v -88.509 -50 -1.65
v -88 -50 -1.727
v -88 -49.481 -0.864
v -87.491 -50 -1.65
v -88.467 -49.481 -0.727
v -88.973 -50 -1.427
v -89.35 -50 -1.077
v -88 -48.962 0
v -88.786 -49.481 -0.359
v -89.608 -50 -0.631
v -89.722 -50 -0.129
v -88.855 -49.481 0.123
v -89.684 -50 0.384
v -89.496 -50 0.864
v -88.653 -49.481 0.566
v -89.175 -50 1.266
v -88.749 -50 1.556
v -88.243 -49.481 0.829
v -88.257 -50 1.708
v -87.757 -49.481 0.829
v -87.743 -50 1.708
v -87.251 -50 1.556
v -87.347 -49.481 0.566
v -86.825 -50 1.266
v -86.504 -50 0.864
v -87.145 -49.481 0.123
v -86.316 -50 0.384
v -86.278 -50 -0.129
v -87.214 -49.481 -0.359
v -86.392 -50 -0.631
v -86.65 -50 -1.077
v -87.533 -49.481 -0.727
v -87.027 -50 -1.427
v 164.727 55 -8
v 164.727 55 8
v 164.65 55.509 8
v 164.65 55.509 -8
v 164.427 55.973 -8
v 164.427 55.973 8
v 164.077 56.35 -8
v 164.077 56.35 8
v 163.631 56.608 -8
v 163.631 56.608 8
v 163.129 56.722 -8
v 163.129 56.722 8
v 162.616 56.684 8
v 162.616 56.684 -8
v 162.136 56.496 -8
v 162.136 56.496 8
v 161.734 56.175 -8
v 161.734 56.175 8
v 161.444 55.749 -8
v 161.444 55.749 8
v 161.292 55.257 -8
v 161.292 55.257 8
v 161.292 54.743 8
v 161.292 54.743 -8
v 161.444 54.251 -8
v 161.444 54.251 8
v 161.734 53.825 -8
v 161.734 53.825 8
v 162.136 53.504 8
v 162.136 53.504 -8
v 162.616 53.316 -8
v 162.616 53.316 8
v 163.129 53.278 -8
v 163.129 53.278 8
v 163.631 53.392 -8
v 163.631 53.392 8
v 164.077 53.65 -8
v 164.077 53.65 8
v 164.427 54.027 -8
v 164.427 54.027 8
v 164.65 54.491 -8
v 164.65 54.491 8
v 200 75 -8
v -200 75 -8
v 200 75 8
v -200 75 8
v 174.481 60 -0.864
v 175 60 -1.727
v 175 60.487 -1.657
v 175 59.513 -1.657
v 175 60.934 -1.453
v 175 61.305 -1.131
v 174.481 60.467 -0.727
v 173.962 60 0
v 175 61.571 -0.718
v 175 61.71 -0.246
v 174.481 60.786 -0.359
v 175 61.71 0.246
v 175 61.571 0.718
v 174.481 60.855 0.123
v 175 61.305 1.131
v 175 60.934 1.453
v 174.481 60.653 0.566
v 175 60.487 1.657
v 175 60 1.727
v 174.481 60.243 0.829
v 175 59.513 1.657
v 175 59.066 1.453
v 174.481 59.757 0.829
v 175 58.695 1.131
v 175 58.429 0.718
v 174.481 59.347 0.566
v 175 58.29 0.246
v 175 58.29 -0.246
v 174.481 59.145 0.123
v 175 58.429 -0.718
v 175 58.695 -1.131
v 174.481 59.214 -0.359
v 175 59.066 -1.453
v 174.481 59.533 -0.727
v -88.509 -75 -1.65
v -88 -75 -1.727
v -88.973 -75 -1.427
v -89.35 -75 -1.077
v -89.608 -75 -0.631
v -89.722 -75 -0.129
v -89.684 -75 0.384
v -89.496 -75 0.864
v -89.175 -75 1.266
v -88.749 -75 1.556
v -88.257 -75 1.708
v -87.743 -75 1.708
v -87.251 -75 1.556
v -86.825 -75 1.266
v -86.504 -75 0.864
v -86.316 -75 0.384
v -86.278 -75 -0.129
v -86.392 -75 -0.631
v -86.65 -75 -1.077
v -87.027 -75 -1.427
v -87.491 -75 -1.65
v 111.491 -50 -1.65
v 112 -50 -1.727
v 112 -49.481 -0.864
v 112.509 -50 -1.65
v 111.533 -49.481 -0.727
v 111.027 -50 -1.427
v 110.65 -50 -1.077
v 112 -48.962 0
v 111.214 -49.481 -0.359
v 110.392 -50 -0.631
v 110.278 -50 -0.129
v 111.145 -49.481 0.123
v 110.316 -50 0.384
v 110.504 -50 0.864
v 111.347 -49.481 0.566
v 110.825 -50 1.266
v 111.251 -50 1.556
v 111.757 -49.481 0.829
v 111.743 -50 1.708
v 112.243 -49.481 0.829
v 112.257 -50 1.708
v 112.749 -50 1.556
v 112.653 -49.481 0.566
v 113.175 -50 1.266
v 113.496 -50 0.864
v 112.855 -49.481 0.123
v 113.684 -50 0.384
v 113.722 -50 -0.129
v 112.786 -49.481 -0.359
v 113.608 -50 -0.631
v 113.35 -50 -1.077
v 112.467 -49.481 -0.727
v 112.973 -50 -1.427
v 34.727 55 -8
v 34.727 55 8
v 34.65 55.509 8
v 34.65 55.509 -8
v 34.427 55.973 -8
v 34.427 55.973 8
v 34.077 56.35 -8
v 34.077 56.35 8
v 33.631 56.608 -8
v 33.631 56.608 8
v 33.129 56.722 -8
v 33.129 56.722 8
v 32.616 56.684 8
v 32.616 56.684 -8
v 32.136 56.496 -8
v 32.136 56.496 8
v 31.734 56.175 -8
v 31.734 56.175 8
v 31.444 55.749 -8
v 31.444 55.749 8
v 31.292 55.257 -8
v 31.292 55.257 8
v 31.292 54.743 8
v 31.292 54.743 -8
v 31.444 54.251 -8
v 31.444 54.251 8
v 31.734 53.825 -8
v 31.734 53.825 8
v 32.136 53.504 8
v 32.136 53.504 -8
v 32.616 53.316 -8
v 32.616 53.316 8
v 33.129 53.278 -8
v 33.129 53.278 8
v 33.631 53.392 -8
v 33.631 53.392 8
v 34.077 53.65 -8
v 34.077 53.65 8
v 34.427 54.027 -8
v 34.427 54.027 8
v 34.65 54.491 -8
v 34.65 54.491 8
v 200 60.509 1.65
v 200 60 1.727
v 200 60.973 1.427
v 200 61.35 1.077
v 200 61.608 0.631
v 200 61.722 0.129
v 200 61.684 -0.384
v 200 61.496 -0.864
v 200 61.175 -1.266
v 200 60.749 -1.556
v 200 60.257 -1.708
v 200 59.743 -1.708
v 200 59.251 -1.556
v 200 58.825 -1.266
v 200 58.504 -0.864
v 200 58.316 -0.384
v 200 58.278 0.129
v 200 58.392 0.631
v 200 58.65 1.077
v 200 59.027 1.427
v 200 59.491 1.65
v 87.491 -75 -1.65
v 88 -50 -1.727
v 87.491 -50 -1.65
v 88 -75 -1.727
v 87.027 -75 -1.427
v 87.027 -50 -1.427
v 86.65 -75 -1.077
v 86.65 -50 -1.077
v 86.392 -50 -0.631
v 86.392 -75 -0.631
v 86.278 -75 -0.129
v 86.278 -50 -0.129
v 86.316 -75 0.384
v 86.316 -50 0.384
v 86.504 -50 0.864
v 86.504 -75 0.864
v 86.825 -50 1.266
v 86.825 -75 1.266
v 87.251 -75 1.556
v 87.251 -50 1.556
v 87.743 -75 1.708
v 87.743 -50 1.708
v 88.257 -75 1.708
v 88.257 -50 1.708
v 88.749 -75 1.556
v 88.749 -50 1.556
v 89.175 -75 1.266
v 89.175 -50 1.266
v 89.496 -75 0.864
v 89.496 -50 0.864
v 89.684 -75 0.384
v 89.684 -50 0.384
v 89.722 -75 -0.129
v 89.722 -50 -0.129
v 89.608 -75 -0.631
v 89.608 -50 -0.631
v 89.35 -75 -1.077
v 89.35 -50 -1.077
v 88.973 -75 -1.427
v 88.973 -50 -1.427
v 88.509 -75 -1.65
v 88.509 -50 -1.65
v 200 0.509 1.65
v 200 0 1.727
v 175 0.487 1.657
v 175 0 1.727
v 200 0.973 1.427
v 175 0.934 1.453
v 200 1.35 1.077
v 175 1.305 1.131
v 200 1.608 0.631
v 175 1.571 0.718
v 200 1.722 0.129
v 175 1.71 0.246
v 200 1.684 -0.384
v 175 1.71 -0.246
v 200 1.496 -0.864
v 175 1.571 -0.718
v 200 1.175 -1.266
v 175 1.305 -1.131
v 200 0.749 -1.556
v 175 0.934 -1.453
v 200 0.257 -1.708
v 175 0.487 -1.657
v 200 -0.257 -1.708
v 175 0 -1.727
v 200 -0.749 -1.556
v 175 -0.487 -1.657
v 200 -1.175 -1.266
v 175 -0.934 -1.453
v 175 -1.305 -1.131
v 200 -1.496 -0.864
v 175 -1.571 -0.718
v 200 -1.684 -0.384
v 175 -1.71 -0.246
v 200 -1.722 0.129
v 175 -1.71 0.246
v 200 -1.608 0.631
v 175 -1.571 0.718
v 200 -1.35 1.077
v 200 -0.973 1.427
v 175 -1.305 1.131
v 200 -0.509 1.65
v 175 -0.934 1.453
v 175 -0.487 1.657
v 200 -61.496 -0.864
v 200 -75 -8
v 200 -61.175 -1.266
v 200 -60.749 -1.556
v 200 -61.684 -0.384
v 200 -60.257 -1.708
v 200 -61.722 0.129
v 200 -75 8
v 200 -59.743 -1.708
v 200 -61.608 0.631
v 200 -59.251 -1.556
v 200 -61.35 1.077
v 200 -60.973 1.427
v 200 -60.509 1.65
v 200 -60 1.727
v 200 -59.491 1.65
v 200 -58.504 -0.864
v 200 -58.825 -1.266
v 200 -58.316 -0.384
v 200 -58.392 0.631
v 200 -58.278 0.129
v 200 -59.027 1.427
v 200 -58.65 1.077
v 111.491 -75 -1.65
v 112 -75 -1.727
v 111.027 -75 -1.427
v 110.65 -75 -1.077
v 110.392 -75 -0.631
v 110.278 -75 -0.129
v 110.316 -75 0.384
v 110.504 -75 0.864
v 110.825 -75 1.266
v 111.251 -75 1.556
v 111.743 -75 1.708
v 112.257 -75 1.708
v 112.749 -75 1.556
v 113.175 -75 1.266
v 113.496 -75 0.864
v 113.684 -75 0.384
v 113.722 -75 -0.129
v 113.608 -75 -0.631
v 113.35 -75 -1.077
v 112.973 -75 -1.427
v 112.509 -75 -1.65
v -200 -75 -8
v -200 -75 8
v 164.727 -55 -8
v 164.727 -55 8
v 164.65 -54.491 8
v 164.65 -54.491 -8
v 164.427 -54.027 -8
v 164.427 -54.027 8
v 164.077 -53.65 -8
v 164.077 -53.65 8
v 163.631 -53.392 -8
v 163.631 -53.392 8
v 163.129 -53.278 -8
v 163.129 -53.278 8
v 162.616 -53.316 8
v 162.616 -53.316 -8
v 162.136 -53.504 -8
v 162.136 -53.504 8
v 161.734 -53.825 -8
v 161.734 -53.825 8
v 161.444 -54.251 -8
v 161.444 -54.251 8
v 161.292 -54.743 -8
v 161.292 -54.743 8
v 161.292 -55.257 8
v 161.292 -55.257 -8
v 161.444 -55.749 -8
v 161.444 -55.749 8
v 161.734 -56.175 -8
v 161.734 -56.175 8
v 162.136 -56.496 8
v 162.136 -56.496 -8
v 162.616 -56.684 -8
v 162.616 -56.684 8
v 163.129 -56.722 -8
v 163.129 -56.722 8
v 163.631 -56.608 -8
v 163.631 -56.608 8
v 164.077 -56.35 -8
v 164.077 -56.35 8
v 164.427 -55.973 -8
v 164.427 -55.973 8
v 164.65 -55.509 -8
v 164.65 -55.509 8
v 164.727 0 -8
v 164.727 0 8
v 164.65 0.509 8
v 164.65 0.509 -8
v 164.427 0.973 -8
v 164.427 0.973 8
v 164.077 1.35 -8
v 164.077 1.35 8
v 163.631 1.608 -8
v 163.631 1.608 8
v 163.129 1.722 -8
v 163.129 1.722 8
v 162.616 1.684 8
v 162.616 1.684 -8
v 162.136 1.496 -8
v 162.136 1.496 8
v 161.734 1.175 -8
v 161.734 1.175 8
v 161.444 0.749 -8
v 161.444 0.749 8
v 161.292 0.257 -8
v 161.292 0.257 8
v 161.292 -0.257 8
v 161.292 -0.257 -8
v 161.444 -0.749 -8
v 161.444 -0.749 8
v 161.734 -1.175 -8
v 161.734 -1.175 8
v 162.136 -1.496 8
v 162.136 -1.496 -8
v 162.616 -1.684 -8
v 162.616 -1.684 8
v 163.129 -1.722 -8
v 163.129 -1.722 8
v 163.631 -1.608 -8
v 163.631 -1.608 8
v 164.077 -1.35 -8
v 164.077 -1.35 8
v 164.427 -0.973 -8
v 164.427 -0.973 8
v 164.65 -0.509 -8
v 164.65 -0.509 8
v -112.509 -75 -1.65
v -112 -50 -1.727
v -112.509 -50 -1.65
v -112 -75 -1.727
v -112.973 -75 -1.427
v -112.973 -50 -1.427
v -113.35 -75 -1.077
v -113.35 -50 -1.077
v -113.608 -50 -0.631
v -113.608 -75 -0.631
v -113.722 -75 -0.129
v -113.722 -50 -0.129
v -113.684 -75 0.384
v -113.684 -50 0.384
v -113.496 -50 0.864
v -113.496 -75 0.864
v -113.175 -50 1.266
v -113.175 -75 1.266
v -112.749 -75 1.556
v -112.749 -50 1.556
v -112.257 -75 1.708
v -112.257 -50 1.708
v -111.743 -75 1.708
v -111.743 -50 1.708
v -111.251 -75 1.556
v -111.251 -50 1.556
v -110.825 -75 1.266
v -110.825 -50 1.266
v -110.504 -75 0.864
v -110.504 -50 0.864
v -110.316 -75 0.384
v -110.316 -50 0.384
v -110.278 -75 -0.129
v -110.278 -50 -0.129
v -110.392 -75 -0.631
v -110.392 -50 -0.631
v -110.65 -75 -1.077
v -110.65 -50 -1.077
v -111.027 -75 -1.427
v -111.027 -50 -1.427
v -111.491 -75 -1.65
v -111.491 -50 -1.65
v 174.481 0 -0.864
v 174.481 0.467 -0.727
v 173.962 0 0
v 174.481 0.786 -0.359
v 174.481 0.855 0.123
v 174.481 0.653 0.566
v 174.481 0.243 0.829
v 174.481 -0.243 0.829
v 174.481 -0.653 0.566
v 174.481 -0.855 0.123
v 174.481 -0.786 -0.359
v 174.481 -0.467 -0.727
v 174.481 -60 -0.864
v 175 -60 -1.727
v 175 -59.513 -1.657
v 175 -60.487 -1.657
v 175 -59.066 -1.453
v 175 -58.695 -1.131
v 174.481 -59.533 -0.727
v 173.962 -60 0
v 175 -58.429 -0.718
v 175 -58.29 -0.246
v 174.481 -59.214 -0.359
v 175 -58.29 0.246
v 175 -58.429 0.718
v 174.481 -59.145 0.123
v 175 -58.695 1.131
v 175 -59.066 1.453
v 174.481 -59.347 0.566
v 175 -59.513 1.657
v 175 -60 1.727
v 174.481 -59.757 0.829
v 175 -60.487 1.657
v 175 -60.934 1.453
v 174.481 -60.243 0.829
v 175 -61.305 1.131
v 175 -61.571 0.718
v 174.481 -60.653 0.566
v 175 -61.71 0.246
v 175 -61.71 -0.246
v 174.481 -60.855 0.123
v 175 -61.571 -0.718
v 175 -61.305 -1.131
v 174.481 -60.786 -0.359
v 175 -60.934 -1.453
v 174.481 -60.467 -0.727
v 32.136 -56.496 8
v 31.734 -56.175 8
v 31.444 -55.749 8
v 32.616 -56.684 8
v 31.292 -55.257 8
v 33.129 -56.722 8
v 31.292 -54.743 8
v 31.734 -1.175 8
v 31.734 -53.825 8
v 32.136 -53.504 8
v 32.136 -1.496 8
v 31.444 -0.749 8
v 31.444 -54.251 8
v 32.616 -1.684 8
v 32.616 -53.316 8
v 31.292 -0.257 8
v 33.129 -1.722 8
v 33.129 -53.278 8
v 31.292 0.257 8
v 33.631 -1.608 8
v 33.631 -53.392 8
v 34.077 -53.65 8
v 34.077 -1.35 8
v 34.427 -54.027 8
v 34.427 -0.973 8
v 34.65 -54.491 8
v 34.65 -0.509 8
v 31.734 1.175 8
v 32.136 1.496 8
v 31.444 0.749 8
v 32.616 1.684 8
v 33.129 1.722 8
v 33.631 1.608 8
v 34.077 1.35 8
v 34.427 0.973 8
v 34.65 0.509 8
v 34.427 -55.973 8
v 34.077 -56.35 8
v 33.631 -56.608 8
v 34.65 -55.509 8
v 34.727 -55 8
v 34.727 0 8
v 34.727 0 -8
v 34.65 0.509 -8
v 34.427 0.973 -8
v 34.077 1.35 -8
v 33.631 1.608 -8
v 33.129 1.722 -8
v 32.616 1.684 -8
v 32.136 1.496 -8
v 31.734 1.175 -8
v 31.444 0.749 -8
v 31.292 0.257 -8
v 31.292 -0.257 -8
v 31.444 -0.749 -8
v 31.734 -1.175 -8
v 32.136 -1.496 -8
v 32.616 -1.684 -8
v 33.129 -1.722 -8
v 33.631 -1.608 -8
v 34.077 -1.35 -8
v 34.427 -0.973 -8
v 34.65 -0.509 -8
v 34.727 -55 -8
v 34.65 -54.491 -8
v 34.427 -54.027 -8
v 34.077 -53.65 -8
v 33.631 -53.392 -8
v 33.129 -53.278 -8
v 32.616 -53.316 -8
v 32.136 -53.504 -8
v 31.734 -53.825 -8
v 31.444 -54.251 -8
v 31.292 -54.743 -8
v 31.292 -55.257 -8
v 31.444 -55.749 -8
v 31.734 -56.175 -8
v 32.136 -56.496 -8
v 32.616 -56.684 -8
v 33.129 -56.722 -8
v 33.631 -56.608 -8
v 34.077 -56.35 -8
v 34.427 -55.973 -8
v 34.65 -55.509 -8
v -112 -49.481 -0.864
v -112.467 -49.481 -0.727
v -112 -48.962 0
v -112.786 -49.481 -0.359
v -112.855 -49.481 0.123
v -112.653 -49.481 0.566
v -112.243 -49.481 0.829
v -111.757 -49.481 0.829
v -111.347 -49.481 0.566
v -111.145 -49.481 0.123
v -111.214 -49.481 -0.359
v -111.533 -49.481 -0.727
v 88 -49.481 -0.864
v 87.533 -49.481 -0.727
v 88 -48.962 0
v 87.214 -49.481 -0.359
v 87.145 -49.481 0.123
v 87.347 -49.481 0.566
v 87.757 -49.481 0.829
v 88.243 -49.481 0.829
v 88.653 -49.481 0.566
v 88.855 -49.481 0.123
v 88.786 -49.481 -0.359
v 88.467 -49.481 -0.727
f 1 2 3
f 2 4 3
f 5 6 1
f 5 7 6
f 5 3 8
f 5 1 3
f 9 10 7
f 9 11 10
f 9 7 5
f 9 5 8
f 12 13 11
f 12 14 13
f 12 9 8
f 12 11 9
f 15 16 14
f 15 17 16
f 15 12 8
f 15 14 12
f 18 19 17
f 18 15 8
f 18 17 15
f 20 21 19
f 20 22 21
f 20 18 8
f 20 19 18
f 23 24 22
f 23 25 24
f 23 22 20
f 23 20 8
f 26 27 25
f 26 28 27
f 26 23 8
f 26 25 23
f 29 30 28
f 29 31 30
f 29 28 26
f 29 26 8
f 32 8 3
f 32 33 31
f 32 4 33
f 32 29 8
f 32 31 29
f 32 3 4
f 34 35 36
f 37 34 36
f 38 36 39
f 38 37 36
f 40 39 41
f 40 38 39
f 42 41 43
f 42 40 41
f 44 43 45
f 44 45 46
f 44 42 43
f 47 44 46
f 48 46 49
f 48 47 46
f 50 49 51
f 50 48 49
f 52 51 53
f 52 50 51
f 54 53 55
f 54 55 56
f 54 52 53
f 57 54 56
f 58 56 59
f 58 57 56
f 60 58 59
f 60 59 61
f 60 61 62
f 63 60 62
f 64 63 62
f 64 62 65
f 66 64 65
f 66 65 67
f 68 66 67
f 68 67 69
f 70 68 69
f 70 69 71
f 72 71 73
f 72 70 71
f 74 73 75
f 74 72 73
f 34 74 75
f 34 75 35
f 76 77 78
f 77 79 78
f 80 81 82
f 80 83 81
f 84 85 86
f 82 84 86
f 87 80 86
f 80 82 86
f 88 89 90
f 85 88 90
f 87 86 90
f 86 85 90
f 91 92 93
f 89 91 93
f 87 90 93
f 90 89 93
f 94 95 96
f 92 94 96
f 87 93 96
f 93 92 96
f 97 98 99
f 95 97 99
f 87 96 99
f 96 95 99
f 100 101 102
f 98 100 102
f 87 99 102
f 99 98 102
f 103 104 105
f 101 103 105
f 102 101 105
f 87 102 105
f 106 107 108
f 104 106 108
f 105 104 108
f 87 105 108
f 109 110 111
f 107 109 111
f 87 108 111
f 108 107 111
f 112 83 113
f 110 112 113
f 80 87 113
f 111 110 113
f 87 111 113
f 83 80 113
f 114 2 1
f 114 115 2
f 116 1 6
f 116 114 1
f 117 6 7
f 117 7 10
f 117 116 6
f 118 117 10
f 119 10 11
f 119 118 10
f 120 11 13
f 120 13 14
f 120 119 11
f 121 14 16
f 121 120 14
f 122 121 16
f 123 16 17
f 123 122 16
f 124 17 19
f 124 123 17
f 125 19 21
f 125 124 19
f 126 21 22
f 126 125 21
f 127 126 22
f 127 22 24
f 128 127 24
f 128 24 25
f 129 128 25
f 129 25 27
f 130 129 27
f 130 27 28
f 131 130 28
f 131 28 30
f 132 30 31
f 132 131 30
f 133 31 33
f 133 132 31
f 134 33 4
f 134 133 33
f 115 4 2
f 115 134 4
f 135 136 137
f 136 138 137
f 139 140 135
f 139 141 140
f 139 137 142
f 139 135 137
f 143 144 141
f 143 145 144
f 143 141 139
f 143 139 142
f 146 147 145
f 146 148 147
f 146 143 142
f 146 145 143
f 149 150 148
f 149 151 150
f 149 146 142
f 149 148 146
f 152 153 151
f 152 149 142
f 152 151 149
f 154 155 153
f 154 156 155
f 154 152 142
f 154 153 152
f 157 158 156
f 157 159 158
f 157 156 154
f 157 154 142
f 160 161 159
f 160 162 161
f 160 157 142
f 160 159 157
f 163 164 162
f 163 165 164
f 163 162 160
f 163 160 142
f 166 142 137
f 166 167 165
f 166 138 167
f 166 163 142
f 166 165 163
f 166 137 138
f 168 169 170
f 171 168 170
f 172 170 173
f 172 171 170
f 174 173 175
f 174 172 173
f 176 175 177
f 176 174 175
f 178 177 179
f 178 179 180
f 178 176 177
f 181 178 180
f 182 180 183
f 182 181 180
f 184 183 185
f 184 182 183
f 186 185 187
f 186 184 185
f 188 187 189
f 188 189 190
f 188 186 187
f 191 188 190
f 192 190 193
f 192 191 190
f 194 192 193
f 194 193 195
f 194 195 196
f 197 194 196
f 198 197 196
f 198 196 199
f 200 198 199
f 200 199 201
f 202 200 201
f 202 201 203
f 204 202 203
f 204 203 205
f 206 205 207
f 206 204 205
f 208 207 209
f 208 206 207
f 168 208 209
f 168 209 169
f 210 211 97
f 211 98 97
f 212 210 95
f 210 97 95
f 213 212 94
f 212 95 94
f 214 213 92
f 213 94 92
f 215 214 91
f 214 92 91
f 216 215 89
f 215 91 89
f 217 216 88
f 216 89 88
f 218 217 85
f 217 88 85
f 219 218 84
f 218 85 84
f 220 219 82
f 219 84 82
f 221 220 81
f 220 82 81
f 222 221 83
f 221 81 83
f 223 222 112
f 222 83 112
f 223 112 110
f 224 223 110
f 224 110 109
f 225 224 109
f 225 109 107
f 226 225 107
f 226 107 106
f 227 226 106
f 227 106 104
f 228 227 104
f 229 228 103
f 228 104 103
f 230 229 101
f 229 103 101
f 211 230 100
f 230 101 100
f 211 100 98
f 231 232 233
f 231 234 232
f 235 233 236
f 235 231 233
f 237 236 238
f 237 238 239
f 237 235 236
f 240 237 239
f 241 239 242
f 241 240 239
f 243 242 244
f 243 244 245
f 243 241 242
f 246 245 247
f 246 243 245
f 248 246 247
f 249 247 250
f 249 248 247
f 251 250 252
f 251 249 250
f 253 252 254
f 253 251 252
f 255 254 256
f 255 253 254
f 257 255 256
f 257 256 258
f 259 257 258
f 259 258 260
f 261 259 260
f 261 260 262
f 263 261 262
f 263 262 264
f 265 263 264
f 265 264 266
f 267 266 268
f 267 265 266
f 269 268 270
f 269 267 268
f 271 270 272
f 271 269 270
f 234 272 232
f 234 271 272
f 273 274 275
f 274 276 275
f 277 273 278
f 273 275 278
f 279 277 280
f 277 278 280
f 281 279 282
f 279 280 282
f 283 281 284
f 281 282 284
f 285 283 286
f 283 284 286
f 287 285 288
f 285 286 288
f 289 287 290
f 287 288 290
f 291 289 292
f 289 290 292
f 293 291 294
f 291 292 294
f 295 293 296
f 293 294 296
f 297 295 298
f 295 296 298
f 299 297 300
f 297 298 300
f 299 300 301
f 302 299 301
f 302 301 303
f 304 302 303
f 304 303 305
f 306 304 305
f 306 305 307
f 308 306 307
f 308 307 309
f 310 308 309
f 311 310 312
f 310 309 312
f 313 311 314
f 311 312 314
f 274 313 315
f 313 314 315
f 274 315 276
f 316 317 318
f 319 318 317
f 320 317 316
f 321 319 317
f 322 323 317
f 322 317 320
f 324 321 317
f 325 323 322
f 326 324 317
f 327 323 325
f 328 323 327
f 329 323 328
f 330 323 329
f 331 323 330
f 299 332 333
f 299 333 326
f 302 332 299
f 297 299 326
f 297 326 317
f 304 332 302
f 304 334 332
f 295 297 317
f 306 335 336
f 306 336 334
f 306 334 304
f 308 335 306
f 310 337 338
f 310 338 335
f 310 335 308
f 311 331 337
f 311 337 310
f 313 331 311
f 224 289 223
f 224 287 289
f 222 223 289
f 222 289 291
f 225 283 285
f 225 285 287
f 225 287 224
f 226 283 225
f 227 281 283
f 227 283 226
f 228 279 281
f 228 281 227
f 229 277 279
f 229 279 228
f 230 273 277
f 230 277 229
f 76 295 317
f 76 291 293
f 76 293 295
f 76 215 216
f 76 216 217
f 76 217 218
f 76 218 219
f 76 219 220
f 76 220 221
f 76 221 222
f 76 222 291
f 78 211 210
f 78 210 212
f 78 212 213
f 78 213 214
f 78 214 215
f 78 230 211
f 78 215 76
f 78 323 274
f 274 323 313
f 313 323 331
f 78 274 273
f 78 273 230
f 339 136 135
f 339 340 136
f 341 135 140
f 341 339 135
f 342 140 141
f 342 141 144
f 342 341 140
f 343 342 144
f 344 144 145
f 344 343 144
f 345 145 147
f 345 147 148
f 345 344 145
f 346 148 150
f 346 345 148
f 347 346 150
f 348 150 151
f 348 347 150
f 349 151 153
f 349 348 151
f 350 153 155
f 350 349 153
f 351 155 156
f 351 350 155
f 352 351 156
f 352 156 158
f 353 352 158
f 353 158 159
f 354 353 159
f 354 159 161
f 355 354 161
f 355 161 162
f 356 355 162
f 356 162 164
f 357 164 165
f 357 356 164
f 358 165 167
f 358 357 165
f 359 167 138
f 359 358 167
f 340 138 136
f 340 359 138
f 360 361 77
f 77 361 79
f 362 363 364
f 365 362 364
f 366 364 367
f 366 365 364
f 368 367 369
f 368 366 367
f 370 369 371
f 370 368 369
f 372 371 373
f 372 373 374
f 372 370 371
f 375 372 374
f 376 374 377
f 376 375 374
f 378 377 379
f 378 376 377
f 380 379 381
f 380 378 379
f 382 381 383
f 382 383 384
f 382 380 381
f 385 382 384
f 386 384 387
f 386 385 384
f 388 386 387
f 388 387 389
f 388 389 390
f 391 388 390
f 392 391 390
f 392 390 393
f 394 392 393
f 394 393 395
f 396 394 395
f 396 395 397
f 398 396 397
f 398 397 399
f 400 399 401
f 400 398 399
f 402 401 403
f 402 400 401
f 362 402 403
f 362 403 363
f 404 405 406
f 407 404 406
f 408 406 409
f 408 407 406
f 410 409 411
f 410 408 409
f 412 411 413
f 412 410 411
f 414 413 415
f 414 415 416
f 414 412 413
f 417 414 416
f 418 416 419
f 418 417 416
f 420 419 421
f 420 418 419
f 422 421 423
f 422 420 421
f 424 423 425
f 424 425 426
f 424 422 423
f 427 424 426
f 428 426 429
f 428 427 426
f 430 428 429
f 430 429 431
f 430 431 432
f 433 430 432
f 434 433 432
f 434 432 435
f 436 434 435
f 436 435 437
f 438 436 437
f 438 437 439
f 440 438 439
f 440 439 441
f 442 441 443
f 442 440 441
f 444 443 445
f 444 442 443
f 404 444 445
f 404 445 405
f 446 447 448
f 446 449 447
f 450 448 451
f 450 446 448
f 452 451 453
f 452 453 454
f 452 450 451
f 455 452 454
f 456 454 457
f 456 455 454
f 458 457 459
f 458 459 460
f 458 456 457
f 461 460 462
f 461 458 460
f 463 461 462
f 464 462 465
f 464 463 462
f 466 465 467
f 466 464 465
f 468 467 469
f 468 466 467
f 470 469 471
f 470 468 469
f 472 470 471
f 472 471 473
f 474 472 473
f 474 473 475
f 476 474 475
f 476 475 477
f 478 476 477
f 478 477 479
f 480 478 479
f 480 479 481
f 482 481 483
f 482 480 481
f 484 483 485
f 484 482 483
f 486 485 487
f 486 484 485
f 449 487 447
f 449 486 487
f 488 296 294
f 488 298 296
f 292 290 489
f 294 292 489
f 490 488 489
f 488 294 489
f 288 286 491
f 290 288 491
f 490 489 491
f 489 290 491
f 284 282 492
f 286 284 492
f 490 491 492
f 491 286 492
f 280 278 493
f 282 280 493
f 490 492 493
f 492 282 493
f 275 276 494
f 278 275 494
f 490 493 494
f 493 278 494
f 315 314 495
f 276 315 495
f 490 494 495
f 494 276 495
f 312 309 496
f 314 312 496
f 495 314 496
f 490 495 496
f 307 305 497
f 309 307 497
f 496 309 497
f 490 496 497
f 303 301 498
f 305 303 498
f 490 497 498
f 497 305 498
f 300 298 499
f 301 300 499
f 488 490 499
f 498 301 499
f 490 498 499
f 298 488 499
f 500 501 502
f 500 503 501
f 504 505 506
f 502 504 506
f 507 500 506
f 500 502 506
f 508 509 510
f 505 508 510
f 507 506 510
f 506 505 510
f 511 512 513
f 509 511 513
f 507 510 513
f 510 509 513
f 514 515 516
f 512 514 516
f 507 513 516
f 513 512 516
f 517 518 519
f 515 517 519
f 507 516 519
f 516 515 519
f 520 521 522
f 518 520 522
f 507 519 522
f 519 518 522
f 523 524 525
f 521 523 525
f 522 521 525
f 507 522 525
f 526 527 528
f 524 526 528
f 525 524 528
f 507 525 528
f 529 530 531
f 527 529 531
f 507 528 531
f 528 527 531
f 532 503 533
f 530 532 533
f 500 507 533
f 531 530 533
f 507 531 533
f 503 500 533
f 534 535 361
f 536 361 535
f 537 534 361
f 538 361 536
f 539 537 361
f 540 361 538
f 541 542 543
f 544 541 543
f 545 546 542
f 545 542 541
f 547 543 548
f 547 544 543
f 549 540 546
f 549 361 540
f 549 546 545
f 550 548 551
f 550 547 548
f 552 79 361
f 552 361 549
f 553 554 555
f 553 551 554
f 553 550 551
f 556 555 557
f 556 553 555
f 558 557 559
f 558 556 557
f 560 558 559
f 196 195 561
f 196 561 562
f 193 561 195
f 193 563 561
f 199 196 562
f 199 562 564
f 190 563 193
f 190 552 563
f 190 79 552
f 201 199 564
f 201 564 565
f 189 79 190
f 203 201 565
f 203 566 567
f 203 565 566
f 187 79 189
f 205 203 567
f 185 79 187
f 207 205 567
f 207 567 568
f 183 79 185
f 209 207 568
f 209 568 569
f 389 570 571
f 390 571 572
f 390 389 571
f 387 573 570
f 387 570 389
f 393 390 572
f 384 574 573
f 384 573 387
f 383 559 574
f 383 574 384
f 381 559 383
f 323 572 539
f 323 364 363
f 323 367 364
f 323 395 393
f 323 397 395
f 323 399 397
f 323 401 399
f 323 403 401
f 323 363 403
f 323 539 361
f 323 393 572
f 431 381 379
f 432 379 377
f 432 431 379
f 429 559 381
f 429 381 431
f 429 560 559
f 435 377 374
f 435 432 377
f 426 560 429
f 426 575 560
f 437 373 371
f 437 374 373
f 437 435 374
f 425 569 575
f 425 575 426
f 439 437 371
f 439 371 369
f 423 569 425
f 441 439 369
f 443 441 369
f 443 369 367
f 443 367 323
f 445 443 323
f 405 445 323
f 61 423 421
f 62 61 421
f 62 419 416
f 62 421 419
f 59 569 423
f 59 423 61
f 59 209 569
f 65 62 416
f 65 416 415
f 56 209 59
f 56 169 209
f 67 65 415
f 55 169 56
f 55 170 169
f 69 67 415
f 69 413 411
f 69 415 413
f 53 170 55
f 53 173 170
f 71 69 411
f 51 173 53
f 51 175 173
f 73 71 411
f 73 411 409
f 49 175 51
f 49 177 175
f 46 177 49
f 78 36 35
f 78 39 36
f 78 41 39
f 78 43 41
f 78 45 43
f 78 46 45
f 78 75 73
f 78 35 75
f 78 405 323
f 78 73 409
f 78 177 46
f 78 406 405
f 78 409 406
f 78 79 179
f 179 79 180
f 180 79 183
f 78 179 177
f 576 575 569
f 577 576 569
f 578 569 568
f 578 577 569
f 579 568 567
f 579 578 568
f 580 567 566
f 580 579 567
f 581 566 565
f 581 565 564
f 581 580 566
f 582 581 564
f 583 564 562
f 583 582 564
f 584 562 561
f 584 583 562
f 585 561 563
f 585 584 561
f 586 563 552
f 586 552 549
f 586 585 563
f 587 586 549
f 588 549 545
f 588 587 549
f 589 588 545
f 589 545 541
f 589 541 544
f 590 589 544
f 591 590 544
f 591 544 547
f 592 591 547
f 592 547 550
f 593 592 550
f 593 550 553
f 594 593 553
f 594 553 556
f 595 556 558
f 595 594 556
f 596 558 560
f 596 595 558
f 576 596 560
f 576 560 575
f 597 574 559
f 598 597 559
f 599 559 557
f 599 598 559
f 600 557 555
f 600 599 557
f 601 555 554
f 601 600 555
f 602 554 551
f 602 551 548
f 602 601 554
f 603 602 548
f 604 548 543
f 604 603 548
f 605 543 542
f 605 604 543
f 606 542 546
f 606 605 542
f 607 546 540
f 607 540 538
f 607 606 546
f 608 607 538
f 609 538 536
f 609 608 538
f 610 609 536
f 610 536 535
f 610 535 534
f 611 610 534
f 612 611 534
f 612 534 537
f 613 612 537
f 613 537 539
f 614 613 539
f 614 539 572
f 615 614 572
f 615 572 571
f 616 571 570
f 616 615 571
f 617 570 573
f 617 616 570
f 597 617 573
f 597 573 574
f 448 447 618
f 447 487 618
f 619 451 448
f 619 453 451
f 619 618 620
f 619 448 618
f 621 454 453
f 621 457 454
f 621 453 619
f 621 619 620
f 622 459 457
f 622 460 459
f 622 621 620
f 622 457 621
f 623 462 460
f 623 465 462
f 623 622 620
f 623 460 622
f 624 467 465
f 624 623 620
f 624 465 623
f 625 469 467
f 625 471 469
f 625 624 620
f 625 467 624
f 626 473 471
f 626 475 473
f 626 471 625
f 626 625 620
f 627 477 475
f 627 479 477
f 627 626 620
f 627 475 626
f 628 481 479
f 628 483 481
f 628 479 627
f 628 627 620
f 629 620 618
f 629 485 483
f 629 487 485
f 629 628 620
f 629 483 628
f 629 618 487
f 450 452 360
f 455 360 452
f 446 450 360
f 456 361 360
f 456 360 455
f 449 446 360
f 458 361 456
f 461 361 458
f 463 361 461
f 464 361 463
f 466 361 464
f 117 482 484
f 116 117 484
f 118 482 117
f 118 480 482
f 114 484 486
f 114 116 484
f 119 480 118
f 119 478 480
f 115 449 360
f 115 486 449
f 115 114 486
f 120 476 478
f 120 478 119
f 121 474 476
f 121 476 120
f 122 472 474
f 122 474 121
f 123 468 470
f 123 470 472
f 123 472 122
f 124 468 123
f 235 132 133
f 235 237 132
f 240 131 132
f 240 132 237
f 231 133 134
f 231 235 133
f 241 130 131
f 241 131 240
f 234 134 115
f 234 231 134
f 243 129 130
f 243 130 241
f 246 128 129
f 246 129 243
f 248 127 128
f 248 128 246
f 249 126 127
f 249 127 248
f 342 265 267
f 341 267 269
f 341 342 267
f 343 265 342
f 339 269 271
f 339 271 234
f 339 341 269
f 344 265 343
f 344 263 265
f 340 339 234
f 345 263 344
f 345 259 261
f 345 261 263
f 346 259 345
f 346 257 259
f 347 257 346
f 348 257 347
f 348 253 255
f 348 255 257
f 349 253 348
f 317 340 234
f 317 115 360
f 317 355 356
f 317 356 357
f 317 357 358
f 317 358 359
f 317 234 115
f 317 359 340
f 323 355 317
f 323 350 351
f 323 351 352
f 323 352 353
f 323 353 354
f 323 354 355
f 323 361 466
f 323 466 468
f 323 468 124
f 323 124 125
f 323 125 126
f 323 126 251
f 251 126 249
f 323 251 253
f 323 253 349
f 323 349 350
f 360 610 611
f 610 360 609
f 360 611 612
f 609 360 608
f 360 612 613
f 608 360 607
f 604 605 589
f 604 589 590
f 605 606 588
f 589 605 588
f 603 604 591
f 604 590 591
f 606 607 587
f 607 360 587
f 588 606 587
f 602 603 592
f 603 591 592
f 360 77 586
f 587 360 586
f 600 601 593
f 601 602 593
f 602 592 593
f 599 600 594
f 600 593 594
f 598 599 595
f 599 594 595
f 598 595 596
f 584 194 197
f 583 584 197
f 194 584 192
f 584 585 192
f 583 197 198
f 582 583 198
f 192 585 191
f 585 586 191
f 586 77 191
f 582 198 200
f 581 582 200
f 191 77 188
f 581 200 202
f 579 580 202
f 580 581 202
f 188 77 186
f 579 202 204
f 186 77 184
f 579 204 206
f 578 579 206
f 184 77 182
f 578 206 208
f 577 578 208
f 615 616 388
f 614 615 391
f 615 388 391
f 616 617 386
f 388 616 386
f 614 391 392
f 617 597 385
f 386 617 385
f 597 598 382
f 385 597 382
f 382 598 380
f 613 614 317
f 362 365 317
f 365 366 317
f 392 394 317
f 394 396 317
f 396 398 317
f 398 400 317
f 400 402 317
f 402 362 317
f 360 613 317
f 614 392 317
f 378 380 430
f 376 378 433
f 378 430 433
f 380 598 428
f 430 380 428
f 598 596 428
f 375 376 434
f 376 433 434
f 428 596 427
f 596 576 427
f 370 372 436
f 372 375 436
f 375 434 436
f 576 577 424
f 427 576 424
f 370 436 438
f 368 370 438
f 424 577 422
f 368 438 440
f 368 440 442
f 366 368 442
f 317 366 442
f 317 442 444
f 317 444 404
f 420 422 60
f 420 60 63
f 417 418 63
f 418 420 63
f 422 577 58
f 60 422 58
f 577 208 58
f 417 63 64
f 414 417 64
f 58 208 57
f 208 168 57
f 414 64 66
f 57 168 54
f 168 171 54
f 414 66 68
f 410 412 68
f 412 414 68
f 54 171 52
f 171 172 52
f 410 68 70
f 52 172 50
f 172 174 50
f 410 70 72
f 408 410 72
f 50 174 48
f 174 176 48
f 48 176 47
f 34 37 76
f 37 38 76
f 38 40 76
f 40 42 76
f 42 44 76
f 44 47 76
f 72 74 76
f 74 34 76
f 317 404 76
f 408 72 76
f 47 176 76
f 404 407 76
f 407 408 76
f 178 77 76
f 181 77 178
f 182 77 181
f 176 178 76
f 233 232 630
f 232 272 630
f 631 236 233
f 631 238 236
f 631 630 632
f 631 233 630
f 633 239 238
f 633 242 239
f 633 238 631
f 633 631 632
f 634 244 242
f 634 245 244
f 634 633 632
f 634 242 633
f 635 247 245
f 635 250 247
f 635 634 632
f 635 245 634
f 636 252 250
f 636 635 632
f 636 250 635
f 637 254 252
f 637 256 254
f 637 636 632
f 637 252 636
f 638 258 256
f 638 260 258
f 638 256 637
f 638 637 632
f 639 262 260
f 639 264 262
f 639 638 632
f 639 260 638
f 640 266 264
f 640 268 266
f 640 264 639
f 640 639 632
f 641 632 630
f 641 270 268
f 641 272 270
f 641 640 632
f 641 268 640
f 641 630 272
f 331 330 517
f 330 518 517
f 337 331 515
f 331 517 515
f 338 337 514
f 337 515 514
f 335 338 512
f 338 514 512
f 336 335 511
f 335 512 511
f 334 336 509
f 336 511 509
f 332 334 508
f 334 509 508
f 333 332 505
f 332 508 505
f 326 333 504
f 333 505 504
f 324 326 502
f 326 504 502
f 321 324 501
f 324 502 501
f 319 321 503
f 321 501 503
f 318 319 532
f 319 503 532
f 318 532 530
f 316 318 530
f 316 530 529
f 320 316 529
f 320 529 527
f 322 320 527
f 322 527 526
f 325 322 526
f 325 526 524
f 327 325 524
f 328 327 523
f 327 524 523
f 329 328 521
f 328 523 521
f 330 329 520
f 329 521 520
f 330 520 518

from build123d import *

# Parameters (mm, degrees)
SKETCH1_W                      = 400
SKETCH1_H                      = 150
BOSS_EXTRUDE1_DEPTH            = 8
F_8_36_START                   = -8
F_8_36_TAPPED_HOLE1_OUTLINE_R  = 1.7272
F_8_36_TAPPED_HOLE1_DEPTH      = 16
F_8_36_TAPPED_HOLE2_D          = 3.4544
F_8_36_TAPPED_HOLE2_DEPTH      = 25
F_8_36_TAPPED_HOLE2_TIP        = 1.037806461
F_8_36_TAPPED_HOLE3_AT_2_COUNT = 2
F_8_36_TAPPED_HOLE3_AT_2_PITCH = 24
LPATTERN1_COUNT                = 2
LPATTERN1_PITCH                = 200


# Read off the part's stored shape, not the designer's step: #8-36 Tapped Hole1
with BuildPart() as part:
    # Sketch1 → Boss-Extrude1 (new, symmetric)
    with BuildSketch(Plane.XY):
        Rectangle(SKETCH1_W, SKETCH1_H)
    extrude(amount=BOSS_EXTRUDE1_DEPTH, both=True)

    # #8-36 Tapped Hole1 outline → #8-36 Tapped Hole1 (cut)
    with BuildSketch(Plane.XY.offset(F_8_36_START)):
        with Locations((33, 0)):
            Circle(F_8_36_TAPPED_HOLE1_OUTLINE_R)
        with Locations((163, 0)):
            Circle(F_8_36_TAPPED_HOLE1_OUTLINE_R)
        with Locations((163, -55)):
            Circle(F_8_36_TAPPED_HOLE1_OUTLINE_R)
        with Locations((33, 55)):
            Circle(F_8_36_TAPPED_HOLE1_OUTLINE_R)
        with Locations((163, 55)):
            Circle(F_8_36_TAPPED_HOLE1_OUTLINE_R)
        with Locations((33, -55)):
            Circle(F_8_36_TAPPED_HOLE1_OUTLINE_R)
    extrude(amount=F_8_36_TAPPED_HOLE1_DEPTH, mode=Mode.SUBTRACT)

    # #8-36 Tapped Hole2
    with Locations(Plane(origin=(200, -75, -313), x_dir=(0, 0, -1), z_dir=(1, 0, 0))):
        with Locations((-313, 135), (-313, 75), (-313, 15)):
            Hole(F_8_36_TAPPED_HOLE2_D / 2, depth=F_8_36_TAPPED_HOLE2_DEPTH)
            with Locations((0, 0, -(F_8_36_TAPPED_HOLE2_DEPTH + F_8_36_TAPPED_HOLE2_TIP / 2))):  # 118° drill point
                Cone(0, F_8_36_TAPPED_HOLE2_D / 2, F_8_36_TAPPED_HOLE2_TIP, mode=Mode.SUBTRACT)

    # Sketch7 → #8-36 Tapped Hole3 (revolve, cut)
    with BuildSketch(Plane(origin=(-88, -75, 0), x_dir=(0, 0, -1), z_dir=(1, 0, 0))):
        Polygon((0, 0), (0, 26.037806461), (1.7272, 25), (1.7272, 0), align=None)
    f_8_36_tapped_hole3 = revolve(axis=Axis((-88, -81.35, 0), (0, 1, 0)), mode=Mode.SUBTRACT)

    # #8-36 Tapped Hole3 at 2: #8-36 Tapped Hole3 ×2
    with Locations(*[(-i * F_8_36_TAPPED_HOLE3_AT_2_PITCH, 0, 0) for i in range(1, F_8_36_TAPPED_HOLE3_AT_2_COUNT)]):
        add(f_8_36_tapped_hole3, mode=Mode.SUBTRACT)

    # LPattern1: #8-36 Tapped Hole3 ×2
    with Locations(*[(i * LPATTERN1_PITCH, 0, 0) for i in range(1, LPATTERN1_COUNT)]):
        add(f_8_36_tapped_hole3, mode=Mode.SUBTRACT)

    # LPattern1 copy 1 sketch → LPattern1 copy 1 (revolve, cut)
    with BuildSketch(Plane(origin=(88, -75, 0), x_dir=(0, 0, -1), z_dir=(1, 0, 0))):
        Polygon((0, 0), (0, 26.037806461), (1.7272, 25), (1.7272, 0), align=None)
    revolve(axis=Axis((88, -81.35, 0), (0, 1, 0)), mode=Mode.SUBTRACT)


solid = part.part
